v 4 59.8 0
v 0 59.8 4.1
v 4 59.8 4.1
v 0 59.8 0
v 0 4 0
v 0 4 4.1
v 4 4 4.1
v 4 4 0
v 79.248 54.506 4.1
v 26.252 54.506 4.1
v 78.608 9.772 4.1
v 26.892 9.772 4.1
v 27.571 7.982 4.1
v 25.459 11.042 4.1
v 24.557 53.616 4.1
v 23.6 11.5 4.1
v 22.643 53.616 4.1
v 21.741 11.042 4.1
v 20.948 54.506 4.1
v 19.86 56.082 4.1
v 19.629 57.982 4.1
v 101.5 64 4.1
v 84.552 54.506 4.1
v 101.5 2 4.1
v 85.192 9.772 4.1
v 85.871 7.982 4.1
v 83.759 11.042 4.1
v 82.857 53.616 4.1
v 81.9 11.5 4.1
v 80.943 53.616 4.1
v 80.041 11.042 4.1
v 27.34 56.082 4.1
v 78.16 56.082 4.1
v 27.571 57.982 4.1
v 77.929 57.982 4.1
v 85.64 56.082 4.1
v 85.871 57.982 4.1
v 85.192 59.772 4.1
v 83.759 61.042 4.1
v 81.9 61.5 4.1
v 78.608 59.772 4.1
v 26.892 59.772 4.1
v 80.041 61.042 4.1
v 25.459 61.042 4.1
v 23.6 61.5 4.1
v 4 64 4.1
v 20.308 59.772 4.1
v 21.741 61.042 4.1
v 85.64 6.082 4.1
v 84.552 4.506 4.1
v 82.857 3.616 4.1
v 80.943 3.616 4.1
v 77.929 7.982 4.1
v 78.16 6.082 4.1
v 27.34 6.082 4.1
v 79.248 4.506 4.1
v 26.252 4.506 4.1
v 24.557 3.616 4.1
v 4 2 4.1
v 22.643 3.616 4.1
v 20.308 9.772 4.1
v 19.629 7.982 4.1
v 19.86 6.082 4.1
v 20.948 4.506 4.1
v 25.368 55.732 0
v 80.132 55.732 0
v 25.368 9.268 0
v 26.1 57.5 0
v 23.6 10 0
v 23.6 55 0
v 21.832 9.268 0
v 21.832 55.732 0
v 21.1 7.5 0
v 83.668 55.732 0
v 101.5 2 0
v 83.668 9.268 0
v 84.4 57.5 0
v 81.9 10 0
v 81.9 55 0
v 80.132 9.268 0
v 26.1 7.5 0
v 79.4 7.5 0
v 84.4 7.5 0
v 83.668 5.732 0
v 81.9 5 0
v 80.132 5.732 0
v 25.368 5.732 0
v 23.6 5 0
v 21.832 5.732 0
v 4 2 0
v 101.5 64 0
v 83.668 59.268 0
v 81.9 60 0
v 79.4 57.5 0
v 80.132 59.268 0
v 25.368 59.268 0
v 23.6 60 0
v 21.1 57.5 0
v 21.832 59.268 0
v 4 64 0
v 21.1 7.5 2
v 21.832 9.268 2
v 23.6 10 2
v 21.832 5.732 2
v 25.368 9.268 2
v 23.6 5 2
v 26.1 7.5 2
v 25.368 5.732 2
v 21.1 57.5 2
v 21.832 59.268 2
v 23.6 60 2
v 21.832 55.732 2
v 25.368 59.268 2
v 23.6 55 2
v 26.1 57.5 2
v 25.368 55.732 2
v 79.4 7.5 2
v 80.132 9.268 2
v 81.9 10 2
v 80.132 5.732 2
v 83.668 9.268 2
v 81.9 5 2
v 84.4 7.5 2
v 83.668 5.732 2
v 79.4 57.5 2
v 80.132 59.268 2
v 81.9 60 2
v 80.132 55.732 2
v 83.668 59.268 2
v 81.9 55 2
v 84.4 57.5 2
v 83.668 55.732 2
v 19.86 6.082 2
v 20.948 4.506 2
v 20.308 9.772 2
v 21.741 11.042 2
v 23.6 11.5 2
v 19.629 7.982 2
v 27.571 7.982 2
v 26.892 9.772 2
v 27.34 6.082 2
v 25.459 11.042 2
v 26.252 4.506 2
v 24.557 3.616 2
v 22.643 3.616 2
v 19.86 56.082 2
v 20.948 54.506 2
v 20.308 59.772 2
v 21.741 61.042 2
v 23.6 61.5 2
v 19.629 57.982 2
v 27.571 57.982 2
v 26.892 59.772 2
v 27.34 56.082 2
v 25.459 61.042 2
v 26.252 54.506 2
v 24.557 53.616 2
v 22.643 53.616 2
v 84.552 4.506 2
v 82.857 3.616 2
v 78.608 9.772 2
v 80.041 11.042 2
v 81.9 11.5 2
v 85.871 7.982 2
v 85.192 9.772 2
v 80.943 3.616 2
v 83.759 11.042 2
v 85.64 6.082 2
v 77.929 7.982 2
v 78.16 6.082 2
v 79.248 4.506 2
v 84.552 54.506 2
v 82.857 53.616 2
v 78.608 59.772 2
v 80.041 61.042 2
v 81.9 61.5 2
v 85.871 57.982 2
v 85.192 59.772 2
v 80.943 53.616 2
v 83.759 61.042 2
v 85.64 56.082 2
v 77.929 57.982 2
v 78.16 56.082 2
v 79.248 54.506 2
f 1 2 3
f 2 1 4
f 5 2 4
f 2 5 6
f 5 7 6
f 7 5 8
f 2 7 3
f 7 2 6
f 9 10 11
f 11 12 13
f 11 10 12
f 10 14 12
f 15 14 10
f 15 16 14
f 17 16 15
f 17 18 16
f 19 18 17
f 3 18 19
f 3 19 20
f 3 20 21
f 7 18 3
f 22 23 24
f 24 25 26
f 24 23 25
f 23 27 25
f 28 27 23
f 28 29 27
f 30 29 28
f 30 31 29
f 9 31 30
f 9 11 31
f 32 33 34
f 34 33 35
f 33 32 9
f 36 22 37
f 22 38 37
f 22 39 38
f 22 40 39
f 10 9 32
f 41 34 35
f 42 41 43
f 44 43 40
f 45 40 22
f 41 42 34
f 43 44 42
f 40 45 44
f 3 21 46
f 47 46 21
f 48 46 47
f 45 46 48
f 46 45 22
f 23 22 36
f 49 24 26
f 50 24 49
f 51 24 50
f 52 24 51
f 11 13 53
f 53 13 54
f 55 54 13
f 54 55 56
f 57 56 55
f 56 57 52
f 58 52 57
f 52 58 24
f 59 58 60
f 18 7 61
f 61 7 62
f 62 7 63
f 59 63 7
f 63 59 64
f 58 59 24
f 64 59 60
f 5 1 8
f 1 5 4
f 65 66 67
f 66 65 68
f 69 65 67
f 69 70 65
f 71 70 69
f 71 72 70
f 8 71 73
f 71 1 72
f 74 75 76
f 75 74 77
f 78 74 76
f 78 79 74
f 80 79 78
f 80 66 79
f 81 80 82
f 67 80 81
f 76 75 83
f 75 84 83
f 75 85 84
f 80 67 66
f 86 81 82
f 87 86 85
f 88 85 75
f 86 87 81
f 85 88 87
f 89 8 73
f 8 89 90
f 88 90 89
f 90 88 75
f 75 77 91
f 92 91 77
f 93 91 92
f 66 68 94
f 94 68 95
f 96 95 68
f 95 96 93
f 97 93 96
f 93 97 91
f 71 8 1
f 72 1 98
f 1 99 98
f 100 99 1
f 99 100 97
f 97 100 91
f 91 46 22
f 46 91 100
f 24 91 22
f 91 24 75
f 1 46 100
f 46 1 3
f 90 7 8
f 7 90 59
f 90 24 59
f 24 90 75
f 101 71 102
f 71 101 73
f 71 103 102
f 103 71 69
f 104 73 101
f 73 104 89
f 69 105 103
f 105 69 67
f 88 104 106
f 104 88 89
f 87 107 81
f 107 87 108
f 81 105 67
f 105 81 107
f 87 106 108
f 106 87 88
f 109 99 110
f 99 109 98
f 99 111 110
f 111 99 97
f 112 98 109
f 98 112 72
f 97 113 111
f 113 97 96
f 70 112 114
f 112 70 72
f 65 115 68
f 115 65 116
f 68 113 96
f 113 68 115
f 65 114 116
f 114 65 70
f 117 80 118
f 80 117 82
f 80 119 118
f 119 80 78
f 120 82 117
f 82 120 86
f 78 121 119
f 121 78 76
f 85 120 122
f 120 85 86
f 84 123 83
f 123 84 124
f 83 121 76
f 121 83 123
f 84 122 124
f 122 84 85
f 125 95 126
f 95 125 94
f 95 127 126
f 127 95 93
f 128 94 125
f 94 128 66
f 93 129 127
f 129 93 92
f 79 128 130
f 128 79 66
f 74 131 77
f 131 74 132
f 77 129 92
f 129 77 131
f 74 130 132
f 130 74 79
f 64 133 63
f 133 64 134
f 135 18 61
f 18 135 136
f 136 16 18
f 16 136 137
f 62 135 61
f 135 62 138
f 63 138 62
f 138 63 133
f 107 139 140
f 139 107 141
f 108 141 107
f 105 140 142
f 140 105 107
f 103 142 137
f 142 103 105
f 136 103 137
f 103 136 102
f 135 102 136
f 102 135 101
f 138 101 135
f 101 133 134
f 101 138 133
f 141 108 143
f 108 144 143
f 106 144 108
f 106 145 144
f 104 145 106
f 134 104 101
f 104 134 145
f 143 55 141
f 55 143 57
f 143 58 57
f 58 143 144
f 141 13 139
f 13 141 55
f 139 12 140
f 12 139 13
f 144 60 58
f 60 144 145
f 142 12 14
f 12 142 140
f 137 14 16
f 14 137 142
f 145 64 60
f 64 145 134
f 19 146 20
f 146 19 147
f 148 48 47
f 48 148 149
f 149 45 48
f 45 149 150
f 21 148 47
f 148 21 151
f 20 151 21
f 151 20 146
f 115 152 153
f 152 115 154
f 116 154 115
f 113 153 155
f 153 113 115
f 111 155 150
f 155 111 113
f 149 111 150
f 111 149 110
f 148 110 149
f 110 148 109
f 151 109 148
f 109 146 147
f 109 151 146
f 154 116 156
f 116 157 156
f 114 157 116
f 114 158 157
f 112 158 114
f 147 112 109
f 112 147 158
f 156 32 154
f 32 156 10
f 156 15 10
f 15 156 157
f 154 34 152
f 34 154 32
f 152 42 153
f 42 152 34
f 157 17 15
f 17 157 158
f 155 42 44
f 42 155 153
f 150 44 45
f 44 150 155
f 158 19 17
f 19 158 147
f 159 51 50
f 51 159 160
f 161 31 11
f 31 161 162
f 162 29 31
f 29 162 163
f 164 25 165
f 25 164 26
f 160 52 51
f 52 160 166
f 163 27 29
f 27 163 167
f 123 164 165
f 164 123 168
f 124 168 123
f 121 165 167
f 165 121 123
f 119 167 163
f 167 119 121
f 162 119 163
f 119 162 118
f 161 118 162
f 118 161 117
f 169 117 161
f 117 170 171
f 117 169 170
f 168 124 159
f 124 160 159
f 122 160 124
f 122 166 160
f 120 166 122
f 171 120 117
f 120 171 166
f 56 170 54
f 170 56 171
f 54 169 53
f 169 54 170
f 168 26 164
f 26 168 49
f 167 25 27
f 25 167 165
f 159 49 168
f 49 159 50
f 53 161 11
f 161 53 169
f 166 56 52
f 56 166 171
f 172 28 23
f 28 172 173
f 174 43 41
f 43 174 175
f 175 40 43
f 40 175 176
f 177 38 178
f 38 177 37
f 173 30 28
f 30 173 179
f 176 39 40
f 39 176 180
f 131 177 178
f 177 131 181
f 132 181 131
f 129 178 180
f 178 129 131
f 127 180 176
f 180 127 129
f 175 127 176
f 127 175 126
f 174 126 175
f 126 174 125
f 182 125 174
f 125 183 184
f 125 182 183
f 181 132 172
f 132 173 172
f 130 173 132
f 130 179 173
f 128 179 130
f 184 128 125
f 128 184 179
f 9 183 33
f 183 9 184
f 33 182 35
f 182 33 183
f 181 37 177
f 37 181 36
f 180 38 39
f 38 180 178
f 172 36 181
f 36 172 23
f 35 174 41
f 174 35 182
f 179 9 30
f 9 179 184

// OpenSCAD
// file: ../../library.scad
module tubo(
	h/*Altura*/,
	w/*Pared*/,
	d/*Diametro*/
){
  difference()
  {
    cylinder(r=(d/2), h);
    translate([0,0,-0.1])
    cylinder(r=(d/2)-(2*w), h+0.2);
  }
}

module huyoMasPared(
	d/*Diametro del hoyo*/,
	w/*Pared*/,
	h/*Altura*/,
){
  difference()
  {
    cylinder(r=((d+(2*w))/2), h);
    translate([0,0,-0.1])
    cylinder(r=(d/2), h+0.2);
  }
}

module cuboMasPared(
    w1, //Largo
    w2, //Ancho
    p1, //Pared
    p2, //Pared
    h   //Alto
)
{    
    difference()
    {
        translate([-(w1+(p1*2))/2,-(w2+(p2*2))/2,0])
        cube([(w1+(p1*2)),(w2+(p2*2)),h]);
        
        translate([-w1/2,-w2/2,-0.2])
        cube([w1,w2,h*2]);
        
    }
    
    
}

soporteW = 0.7;

module soporteCylinder()
{
  difference()
  {
	cylinder(r=radio,altura);

	translate([0,0,-0.1])
	cylinder(r=radio-soporteW,altura+0.2);
  }

  if(true){
  difference()
  {
	cylinder(r=radio+0.75,1);

	translate([0,0,-0.1])
	cylinder(r=radio-0.75,1.25);
  }}

}

module soporteOval()
{
  difference()
  {
	oval(w=ancho, h=largo, height=alto, center = false);

	translate([0,0,-0.1])
	oval(ancho-soporteW, largo, alto+0.2);
  }

  difference()
  {
	oval(w=ancho+1, h=largo+1, height=1, center = false);

	translate([0,0,-0.1])
	oval(w=ancho-1, h=largo-1, height=1.25, center = false);
  }

}


module oval(w,h, height, center = false)
{
  scale([1, h/w, 1]) cylinder(h=height, r=w, center=center);
}
// file: Tapa.scad
batX = 0;//22.4Ancho frente
batY = 21.4;//Alto frente
batZ = 90.5;//Profundo


pared = 4;
pared2 = 2*pared;
medPared = pared/2;

raspX = 58;
raspY = 18;
raspZ = 84.5;

h = batY+pared2;

mainAreaX = raspX+batX+pared2; 
mainAreaY = batY+pared2;
mainAreaZ = batZ+pared+5+4;

mainAreaIntX = mainAreaX-pared2;
mainAreaIntY = mainAreaY-pared;
mainAreaIntZ = mainAreaZ-pared;

x1 = pared+3.5;
z1 = 23.6;
x2 = x1+50;
x3 = pared+3.5;
z3 = 81.9;

cejaHorPosX = mainAreaX-batX-pared;
cejaVertPosX = mainAreaX-pared-2;
torH = batY+pared;


rotate([90,0,90])
doALl();



module doALl(){
difference()
{
	translate([medPared,0,pared])
	doTop();	

	translate([0,-1,0])
	baseBatTorn(2.5);

	translate([0,2,0])
	baseBatTorn(4);

}
}

module doTop()
{
	translate([2,0,-4])
	cube([
			mainAreaX-pared-6.2,
			pared+0.1,
			mainAreaZ-pared2+medPared
	  	]);
	cube([
			mainAreaX-pared,
			pared+0.1,
			mainAreaZ-pared2+medPared
	  	]);
}



module baseBatTorn(r)
{
//Tornillos
translate([x1,0,z1])
tornCyl(r);
translate([x2,0,z1])
tornCyl(r);
translate([x1,0,z3])
tornCyl(r);
translate([x2,0,z3])
tornCyl(r);
}











module tornCyl(rad)
{
	rotate([-90,0,0])
	{
		cylinder(r=rad,torH);
	}
}
// main file
include <Tapa.scad>
include <../../library.scad>


bigW = 70;
ori = bigW/2;
raspSellR = 59;
tuboH = 140;
H = 18.5;
selloH = 7;
tornR = 2;

huecoPared = 12;
huecoH = 22;

//Activate this to display
if(false)
{
translate([0,0,bigW/2])
rotate([0,90,0])
diffracter();


//soporteCylinder(radio=25.2,altura=3.8);

}


module diffracter(){	

difference(){

//Bloque
translate([-bigW/2,-bigW/2,0])
cube([bigW,bigW,H]);


translate([
						-(bigW-huecoPared)/2,
						-(bigW-huecoPared)/2,
						(huecoH/2)
					])
		cube([
					bigW-huecoPared,
					bigW-huecoPared,
					H-huecoH]
				);


//Diffractador
translate([-27.25,-32.5,-0.1])
cube([54.5,65,5.6]);

//Macro
translate([0,0,5.4])
cylinder(r=(54.5/2),8.2);

//Sello de raspberry
//translate([0,0,-0.1])
//cylinder(r=(raspSellR/2)+1,2);

//Tubo
//translate([0,0,-0.1])
//cylinder(r=(52/2),200);

//Tornillos abajo
translate([-ori+4,-ori+4,-0.1])
cylinder(r=tornR,20);
translate([ori-4,-ori+4,-0.1])
cylinder(r=tornR,20);
translate([-ori+4,ori-4,-0.1])
cylinder(r=tornR,20);
translate([ori-4,ori-4,-0.1])
cylinder(r=tornR,20);

//Hueco
cylinder(r=25.5,H+1);

//Tornillos caja
translate([0,0,(tuboH/2)-7])
rotate([0,90,0])
tornillosArriba();

//Tornillo tripie
translate([-ori-0.1,0,(tuboH/2)+7])
rotate([0,90,0])
cylinder(r=5/2,5.31);

//Sello hembra
translate([0,0,H-3])
cylinder(r=30,4);

}

//Sello cobertura
//translate([0,0,H-1])
//huyoMasPared(58,3,3);


}
